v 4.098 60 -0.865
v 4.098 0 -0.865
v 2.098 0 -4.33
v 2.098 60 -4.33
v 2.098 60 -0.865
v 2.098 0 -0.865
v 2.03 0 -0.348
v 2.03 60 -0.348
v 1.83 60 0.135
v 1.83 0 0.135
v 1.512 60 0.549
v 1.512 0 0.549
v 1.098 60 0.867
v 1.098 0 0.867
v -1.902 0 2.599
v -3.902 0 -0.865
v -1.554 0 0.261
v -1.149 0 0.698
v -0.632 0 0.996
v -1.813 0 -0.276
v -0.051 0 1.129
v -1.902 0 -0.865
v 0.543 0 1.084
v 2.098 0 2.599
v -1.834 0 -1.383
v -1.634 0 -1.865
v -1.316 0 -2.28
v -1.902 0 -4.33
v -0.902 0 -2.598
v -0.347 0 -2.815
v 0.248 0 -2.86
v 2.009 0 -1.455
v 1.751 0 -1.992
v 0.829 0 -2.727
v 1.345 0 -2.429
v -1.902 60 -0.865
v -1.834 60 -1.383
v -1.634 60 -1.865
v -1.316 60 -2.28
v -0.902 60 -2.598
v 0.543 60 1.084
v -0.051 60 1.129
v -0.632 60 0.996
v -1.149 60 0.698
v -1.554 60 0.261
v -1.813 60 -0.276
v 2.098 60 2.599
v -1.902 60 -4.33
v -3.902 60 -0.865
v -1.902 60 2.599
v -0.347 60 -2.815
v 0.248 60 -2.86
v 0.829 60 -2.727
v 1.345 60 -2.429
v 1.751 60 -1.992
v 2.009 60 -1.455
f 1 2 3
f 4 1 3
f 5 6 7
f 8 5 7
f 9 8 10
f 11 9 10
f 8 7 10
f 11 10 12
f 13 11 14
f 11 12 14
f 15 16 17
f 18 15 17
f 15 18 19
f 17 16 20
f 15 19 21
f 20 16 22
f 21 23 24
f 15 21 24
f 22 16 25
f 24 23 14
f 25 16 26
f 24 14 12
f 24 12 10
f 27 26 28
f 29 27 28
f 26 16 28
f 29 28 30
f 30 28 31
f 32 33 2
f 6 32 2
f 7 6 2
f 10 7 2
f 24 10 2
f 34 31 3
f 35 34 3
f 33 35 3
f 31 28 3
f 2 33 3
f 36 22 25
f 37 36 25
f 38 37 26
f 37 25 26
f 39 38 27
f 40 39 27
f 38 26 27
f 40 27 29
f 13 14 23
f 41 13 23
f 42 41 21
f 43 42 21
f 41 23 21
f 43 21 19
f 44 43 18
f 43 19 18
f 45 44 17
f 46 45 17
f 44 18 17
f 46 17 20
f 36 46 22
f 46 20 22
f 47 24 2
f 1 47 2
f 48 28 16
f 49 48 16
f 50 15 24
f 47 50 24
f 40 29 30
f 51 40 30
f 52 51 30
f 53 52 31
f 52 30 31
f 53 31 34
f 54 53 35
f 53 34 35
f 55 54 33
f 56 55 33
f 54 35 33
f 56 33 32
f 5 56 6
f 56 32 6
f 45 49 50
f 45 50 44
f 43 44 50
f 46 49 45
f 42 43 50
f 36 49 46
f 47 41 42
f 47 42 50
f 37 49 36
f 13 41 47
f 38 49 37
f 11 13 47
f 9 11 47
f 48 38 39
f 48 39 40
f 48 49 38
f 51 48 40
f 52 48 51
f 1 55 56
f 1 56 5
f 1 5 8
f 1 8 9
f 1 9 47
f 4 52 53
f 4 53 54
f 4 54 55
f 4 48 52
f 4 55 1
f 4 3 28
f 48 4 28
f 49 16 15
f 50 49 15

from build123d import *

# Parameters (mm, degrees)
EXTRUDE_1_DEPTH = 60


with BuildPart() as part:
    # 草图1 → 凸台-拉伸1 (new body)
    with BuildSketch(Plane(origin=(0, 0, 0), x_dir=(1, 0, 0), z_dir=(0, 1, 0))):
        with BuildLine():
            Line((2.09823197, 4.329567776), (-1.90176803, 4.329567776))
            Line((-1.90176803, 4.329567776), (-0.90176803, 2.597516968))
            ThreePointArc((-0.90176803, 2.597516968), (1.09823197, 2.597516968), (2.09823197, 0.865466161))
            Line((2.09823197, 0.865466161), (4.09823197, 0.865466161))
            Line((4.09823197, 0.865466161), (2.09823197, 4.329567776))
        make_face()
        with BuildLine():
            Line((-0.90176803, 2.597516968), (-1.90176803, 4.329567776))
            Line((-1.90176803, 4.329567776), (-3.90176803, 0.865466161))
            Line((-3.90176803, 0.865466161), (-1.90176803, 0.865466161))
            ThreePointArc((-1.90176803, 0.865466161), (-1.633818837, 1.865466161), (-0.90176803, 2.597516968))
        make_face()
        with BuildLine():
            Line((-1.90176803, 0.865466161), (-3.90176803, 0.865466161))
            Line((-3.90176803, 0.865466161), (-1.90176803, -2.598635455))
            Line((-1.90176803, -2.598635455), (2.09823197, -2.598635455))
            Line((2.09823197, -2.598635455), (1.09823197, -0.866584647))
            ThreePointArc((1.09823197, -0.866584647), (-0.90176803, -0.866584647), (-1.90176803, 0.865466161))
        make_face()
        with BuildLine():
            Line((2.09823197, -2.598635455), (4.09823197, 0.865466161))
            Line((4.09823197, 0.865466161), (2.09823197, 0.865466161))
            ThreePointArc((2.09823197, 0.865466161), (1.830282778, -0.134533839), (1.09823197, -0.866584647))
            Line((1.09823197, -0.866584647), (2.09823197, -2.598635455))
        make_face()
    extrude(amount=EXTRUDE_1_DEPTH)


solid = part.part
